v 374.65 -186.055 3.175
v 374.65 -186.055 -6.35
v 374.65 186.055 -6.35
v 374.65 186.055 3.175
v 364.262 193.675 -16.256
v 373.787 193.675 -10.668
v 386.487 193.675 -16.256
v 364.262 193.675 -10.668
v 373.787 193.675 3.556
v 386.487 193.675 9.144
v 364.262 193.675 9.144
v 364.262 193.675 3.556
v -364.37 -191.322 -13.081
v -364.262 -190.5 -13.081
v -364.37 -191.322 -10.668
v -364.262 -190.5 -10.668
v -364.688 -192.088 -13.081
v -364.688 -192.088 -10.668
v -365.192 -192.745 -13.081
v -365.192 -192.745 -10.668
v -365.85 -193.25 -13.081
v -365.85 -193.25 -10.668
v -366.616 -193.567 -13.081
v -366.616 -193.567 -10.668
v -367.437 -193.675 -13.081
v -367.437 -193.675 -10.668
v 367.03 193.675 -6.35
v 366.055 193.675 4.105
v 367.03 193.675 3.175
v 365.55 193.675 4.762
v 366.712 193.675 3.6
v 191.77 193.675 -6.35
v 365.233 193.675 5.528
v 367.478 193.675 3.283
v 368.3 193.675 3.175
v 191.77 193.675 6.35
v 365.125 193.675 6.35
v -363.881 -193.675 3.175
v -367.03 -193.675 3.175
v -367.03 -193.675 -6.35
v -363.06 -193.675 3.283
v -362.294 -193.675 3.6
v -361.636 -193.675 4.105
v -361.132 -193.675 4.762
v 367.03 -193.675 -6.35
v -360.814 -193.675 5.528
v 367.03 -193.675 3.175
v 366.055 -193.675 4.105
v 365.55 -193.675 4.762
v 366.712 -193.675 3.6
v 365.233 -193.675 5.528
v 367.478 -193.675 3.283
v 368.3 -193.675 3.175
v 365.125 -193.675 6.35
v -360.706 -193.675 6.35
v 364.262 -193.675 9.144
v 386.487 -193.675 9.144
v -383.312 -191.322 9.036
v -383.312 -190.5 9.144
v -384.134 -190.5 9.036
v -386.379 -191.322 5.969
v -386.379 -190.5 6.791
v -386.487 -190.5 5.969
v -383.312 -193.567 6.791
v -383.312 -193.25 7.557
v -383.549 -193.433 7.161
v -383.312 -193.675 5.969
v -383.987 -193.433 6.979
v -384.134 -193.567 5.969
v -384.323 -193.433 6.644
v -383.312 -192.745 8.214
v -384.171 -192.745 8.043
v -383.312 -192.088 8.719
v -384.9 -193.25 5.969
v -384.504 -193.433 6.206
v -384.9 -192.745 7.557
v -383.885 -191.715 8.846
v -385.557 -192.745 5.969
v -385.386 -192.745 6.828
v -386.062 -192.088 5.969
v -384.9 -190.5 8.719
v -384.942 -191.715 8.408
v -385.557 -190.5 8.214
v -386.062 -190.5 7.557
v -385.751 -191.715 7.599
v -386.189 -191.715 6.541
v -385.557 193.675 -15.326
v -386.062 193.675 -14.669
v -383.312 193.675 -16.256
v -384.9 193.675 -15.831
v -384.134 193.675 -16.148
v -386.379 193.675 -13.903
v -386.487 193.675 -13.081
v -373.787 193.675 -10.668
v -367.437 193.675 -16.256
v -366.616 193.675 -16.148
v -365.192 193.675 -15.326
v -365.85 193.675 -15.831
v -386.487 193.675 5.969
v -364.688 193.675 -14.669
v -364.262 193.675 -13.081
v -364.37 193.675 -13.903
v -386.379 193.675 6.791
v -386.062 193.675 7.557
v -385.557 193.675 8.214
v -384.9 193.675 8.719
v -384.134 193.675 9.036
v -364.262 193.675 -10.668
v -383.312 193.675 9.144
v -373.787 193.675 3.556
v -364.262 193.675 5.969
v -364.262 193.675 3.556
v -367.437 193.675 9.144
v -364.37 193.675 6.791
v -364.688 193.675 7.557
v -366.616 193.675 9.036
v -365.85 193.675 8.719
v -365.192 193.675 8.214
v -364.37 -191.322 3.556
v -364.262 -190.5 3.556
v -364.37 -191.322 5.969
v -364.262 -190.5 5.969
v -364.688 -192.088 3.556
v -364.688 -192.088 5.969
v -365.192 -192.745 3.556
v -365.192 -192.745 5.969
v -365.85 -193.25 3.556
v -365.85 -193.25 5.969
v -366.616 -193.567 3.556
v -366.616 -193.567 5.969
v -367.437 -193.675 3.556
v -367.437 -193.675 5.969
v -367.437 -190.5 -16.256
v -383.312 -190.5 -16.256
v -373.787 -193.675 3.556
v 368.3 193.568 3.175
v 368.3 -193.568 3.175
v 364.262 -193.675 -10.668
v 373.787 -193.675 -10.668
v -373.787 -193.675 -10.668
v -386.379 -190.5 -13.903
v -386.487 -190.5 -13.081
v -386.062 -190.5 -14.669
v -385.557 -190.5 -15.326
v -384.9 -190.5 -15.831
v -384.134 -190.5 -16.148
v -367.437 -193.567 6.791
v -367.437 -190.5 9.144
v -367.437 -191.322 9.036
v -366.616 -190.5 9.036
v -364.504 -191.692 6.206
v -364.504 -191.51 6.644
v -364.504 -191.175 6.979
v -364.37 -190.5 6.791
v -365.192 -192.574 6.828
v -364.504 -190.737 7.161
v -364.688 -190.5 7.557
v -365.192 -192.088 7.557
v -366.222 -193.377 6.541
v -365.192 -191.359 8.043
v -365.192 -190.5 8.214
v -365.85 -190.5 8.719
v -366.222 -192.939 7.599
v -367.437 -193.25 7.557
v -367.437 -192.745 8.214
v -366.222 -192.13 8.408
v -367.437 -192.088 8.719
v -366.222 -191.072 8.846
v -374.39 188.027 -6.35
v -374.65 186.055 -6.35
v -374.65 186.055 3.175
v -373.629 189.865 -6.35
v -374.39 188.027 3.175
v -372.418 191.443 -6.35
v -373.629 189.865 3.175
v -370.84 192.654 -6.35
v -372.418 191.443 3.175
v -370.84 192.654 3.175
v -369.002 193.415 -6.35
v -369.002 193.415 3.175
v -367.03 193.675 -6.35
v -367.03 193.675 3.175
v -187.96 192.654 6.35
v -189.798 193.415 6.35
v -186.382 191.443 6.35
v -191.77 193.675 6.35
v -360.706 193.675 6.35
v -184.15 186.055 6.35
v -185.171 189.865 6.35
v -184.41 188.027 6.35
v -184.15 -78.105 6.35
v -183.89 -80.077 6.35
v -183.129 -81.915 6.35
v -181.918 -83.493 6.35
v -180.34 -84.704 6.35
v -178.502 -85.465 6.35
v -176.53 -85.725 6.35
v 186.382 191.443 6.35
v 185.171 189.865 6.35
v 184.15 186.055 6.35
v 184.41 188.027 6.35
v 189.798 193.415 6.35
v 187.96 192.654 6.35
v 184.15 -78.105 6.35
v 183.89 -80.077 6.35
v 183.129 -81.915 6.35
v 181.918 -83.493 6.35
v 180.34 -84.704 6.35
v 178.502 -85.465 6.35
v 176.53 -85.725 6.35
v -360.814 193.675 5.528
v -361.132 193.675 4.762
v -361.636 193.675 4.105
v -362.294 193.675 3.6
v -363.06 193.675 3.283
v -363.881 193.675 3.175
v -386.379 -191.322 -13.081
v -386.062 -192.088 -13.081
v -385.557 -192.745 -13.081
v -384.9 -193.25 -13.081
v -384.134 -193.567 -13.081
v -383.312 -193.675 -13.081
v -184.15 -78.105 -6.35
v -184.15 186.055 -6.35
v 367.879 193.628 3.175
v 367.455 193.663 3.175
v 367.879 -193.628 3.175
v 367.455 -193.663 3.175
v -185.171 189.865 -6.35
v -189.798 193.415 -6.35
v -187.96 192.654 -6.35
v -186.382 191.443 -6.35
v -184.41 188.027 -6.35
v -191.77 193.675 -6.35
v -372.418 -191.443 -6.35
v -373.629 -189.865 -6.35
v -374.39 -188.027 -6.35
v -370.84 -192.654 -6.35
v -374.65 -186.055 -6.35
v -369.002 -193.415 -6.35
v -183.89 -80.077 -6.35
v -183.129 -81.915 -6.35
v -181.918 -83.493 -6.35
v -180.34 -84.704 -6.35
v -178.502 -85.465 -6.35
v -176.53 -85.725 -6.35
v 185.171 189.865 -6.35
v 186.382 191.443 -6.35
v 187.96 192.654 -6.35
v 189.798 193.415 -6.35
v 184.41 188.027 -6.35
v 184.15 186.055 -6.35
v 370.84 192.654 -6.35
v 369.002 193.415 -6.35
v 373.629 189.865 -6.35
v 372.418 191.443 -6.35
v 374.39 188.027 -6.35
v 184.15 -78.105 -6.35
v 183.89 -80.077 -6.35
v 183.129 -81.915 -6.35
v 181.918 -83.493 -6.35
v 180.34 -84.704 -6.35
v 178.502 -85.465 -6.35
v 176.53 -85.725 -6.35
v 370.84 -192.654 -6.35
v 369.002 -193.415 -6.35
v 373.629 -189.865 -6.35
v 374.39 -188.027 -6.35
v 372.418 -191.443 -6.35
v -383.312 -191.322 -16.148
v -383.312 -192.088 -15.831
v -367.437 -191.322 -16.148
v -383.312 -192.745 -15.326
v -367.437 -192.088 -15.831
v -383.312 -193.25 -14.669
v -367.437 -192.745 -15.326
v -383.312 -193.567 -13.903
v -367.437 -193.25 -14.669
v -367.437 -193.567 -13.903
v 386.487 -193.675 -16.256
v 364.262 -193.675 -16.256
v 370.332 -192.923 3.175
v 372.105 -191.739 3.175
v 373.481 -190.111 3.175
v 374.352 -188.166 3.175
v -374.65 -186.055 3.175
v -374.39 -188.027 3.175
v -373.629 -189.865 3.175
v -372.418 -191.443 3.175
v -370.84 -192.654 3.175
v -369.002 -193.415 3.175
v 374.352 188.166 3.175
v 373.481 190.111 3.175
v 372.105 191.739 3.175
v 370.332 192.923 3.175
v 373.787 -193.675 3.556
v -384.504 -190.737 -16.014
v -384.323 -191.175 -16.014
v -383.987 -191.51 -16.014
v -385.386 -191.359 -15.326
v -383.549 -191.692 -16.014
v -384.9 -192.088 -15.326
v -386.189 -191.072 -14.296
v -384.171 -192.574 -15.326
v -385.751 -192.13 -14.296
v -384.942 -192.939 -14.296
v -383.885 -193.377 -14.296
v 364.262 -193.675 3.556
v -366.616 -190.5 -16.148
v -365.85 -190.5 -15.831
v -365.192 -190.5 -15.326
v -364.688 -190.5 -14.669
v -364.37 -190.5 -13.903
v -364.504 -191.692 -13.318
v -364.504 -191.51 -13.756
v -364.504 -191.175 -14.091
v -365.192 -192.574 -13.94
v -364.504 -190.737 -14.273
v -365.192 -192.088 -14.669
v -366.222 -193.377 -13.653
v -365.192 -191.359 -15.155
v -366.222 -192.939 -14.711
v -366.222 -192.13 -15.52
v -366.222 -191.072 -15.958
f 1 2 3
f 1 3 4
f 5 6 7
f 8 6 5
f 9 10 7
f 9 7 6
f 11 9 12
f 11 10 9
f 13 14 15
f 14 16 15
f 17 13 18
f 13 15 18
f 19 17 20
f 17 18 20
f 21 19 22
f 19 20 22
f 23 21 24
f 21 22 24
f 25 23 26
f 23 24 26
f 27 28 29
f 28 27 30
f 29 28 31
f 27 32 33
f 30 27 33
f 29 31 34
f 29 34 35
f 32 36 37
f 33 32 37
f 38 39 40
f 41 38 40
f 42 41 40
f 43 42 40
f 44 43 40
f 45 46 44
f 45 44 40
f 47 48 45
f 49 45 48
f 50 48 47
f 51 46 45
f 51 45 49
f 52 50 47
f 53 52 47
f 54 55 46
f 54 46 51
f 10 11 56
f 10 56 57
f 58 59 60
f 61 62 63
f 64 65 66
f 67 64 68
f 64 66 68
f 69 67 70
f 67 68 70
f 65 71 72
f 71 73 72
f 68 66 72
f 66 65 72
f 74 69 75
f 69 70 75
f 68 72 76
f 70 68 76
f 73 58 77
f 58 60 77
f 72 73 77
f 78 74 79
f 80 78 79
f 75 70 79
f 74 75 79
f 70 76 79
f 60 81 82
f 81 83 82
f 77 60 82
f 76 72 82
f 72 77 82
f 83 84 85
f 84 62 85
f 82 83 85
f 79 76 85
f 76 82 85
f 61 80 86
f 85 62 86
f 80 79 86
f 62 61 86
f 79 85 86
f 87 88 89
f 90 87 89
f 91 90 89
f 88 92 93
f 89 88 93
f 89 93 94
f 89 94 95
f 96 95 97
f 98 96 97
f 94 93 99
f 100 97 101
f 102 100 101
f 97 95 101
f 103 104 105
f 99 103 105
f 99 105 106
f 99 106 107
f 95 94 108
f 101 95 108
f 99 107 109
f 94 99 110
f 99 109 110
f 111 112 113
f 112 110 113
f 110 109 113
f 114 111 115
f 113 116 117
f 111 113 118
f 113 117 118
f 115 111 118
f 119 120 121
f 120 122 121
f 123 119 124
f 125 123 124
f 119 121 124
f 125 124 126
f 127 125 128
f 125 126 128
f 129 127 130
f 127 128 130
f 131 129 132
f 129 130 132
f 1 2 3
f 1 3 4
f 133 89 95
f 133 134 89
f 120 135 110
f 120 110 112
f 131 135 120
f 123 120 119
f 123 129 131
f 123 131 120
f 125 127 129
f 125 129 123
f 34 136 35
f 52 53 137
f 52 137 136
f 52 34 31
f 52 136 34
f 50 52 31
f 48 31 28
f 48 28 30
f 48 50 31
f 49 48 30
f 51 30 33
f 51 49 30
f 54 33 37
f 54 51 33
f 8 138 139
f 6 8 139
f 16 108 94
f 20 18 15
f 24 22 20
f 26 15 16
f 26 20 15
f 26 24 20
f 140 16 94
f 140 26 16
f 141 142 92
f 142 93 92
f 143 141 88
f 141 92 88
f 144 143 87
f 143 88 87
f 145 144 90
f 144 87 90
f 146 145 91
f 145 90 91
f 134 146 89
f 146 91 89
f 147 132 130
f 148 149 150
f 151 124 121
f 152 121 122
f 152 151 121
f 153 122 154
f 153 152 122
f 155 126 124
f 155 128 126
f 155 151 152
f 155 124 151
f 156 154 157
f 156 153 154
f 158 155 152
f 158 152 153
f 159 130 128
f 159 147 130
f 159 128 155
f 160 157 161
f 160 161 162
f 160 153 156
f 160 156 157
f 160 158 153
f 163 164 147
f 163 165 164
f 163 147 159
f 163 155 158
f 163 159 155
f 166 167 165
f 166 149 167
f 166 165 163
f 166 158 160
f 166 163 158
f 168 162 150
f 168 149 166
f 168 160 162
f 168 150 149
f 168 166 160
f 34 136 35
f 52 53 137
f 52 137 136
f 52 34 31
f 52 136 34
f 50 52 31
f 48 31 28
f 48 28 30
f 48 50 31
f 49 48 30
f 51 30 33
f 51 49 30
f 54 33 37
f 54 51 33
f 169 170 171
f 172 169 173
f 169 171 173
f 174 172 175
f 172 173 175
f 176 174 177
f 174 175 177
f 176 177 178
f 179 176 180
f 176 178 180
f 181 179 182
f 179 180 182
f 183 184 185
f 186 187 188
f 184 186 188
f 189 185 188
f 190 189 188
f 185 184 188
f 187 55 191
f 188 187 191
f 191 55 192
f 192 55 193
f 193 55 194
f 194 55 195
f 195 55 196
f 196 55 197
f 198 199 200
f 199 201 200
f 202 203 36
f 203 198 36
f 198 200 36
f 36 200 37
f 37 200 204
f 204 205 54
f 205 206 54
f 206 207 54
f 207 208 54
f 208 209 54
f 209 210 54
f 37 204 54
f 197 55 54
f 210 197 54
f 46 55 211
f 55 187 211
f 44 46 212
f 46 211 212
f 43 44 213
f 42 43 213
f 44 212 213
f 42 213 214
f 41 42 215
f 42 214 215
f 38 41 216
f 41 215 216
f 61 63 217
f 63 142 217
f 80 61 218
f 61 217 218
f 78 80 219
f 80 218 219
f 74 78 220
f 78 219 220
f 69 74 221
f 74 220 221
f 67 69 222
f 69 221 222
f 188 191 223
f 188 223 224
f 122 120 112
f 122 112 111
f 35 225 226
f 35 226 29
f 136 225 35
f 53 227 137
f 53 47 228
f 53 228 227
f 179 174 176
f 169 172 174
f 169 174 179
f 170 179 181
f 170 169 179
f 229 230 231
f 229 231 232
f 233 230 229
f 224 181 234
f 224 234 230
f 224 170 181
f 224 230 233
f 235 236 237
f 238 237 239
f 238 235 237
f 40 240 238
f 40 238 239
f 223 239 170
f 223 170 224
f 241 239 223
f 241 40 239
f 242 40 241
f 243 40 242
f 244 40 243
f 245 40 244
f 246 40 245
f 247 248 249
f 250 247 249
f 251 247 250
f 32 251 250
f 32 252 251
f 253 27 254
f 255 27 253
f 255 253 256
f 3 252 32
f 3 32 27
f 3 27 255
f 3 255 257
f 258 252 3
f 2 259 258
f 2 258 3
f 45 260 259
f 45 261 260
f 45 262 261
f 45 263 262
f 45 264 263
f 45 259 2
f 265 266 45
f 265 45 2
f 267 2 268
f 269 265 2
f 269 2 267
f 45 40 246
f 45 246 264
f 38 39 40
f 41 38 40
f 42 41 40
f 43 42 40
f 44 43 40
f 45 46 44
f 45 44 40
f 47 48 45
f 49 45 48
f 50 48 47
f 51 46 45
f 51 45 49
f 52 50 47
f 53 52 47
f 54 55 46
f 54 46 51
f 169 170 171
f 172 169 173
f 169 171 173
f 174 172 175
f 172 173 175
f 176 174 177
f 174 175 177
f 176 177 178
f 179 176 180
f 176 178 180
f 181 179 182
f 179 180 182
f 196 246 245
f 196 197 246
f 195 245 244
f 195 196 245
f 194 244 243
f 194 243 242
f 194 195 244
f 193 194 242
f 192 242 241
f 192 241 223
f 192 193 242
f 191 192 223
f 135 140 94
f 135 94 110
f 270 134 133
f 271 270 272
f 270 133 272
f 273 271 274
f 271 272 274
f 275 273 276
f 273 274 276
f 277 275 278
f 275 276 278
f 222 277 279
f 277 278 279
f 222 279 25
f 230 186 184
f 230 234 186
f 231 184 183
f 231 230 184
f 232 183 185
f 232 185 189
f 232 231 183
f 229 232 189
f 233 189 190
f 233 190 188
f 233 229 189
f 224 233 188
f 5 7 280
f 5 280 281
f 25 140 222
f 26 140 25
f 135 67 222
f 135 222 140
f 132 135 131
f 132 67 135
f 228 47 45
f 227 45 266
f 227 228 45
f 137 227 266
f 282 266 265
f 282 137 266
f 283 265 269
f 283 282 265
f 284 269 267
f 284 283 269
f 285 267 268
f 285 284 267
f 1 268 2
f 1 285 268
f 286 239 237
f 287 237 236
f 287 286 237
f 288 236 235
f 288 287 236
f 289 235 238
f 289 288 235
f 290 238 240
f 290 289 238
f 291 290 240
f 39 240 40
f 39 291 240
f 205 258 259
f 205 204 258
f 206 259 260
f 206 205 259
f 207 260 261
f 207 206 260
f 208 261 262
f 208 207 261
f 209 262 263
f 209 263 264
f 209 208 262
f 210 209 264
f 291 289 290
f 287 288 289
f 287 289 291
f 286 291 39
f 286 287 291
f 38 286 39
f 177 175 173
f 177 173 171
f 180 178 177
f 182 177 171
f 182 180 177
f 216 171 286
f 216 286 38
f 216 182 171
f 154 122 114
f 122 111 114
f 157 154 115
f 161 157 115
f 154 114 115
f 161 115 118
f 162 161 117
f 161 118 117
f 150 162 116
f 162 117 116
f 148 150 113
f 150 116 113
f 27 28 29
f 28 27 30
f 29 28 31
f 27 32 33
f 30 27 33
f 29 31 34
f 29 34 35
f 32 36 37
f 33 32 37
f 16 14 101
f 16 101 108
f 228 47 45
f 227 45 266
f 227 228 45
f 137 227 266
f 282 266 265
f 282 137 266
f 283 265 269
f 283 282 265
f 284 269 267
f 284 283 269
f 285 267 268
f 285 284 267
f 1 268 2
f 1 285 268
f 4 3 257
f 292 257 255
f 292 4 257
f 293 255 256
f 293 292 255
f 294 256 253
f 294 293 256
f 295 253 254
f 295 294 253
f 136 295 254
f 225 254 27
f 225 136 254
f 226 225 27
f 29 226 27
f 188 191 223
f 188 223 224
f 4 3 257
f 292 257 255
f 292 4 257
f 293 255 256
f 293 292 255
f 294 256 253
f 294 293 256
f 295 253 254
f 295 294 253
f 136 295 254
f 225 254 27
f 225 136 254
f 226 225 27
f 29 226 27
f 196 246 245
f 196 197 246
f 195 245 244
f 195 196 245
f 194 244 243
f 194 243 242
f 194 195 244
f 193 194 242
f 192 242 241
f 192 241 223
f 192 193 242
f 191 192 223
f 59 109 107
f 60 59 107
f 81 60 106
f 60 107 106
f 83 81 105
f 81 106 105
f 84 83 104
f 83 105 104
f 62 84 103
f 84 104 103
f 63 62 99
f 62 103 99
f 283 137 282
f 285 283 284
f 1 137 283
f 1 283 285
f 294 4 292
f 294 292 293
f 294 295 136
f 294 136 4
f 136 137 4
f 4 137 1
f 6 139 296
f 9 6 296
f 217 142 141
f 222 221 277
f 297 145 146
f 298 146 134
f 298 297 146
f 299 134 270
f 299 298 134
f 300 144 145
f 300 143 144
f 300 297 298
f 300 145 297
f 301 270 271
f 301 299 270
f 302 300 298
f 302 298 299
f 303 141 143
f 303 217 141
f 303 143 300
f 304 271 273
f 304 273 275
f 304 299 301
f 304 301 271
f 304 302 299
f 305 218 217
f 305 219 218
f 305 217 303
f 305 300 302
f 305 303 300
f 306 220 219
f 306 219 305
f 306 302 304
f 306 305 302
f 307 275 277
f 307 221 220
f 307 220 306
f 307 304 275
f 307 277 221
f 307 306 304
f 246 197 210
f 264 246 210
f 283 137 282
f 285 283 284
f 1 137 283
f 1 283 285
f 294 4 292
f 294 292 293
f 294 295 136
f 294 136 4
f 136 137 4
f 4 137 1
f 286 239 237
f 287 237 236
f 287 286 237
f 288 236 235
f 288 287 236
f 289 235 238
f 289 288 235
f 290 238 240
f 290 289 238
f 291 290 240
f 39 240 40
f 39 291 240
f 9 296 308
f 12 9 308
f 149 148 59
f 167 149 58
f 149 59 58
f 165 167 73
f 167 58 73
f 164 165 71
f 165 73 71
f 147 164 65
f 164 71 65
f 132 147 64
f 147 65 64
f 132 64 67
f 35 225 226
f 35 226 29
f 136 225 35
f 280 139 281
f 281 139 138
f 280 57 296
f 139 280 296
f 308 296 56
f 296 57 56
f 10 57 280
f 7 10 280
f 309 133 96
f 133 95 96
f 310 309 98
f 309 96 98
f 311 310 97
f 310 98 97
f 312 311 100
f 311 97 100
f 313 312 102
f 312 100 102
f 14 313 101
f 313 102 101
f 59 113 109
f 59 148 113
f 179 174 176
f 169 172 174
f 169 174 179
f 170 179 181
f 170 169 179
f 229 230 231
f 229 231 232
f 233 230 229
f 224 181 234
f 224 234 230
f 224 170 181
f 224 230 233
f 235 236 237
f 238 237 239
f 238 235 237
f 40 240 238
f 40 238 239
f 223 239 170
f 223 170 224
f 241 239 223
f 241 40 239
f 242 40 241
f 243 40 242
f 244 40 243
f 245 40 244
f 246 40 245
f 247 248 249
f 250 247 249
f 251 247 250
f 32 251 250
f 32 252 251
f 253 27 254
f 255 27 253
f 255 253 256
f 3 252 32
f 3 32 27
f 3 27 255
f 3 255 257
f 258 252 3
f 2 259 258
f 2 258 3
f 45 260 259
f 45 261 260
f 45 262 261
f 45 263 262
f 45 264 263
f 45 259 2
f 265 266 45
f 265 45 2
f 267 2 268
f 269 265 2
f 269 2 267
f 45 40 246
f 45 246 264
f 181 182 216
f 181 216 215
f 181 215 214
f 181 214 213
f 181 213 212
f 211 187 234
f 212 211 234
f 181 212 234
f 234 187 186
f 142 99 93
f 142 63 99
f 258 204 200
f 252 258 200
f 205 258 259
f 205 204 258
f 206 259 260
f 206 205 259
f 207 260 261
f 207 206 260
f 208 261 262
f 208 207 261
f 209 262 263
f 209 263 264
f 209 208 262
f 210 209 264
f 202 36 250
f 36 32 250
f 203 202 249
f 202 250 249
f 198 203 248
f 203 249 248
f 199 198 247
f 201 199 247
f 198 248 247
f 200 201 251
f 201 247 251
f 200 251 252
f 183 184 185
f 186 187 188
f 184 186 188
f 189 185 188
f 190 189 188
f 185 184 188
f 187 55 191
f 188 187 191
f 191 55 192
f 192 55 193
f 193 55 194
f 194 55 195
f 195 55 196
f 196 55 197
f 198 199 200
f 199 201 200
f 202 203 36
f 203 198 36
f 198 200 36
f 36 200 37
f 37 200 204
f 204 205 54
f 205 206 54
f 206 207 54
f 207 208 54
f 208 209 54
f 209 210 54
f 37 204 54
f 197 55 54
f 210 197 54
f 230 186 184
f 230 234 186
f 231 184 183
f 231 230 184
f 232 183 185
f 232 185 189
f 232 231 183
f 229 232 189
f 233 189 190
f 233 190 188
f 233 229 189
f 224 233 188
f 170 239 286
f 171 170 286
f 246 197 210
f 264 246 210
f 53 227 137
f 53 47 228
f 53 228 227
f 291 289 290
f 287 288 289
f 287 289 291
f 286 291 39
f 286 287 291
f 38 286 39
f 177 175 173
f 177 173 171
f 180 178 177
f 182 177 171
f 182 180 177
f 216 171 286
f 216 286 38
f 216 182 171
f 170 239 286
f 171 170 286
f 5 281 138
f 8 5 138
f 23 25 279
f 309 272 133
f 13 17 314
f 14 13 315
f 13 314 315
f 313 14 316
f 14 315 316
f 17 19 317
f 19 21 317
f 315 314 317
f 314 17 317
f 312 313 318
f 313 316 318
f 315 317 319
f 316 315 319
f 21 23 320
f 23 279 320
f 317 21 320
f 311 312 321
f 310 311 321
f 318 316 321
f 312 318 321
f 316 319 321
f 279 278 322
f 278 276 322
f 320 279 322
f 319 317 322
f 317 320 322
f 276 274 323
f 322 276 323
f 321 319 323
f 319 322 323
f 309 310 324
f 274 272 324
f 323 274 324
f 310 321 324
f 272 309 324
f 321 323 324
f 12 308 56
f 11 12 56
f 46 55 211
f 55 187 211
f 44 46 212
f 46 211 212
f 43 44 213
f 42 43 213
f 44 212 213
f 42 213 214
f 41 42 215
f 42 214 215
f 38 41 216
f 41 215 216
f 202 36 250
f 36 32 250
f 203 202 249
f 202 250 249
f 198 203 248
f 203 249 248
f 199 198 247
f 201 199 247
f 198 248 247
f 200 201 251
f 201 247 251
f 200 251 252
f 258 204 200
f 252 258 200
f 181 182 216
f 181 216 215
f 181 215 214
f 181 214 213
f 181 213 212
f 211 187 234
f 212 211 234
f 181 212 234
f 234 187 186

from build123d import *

# Parameters (mm, degrees)
F0_W      = 749.3
F0_H      = 12.7
F1_DEPTH  = 193.675
F2_W      = 368.3
F2_H      = 279.4
F3_DEPTH  = 12.7
F4_R      = 7.62
F6_DEPTH  = 3.175
F9_W      = 9.525
F9_H      = 387.35
F10_DEPTH = 3.175
F12_DEPTH = 387.35
F14_DEPTH = 387.35
F16_R     = 3.17499
F16_2_R   = 3.17499
F16_3_R   = 3.17499


# Not quite as in the source:
# - a fillet or chamfer is up to 0.001 mm smaller than in the source, because OpenCascade refuses the exact size
# - a feature of the source that left no trace in its solid (it failed there, or was rolled back) is left out
# - a pattern or mirror of a feature is missing from the dataset's text; its kind, count and spacing are read off the source's solid


with BuildPart() as f1:
    # F0 (on Front) → F1 (new body, symmetric)
    with BuildSketch(Plane.XZ):
        Rectangle(F0_W, F0_H)
    extrude(amount=F1_DEPTH, both=True)

    # F2 (on face) → F3 (cut, symmetric)
    with BuildSketch(Plane.XY.offset(6.35)):
        with Locations((0, 53.975)):
            Rectangle(F2_W, F2_H)
    extrude(amount=F3_DEPTH, both=True, mode=Mode.SUBTRACT)

    # F4
    f4_edges = [f1.edges().sort_by_distance(p)[0] for p in [
        (-184.15, 193.675, 0),
        (-374.65, 193.675, 0),
        (-184.15, -85.725, 0),
        (184.15, -85.725, 0),
        (184.15, 193.675, 0),
        (374.65, 193.675, 0),
        (374.65, -193.675, 0),
        (-374.65, -193.675, 0),
    ]]
    fillet(f4_edges, radius=F4_R)

    # F5 (on face) → F6 (cut)
    with BuildSketch(Plane.XY.offset(6.35)):
        with BuildLine():
            Line((-360.706291008, -193.675), (-360.706291008, 193.675))
            Line((-360.706291008, 193.675), (-368.3, 193.675))
            ThreePointArc((-368.3, 193.675), (-372.7901280605, 191.8151280605), (-374.65, 187.325))
            Line((-374.65, 187.325), (-374.65, -193.675))
            Line((-374.65, -193.675), (-360.706291008, -193.675))
        make_face()
    extrude(amount=-F6_DEPTH, mode=Mode.SUBTRACT)

    # F9 (on face) → F10 (cut)
    with BuildSketch(Plane.XY.offset(6.35)):
        with Locations((369.8875, 0)):
            Rectangle(F9_W, F9_H)
    extrude(amount=-F10_DEPTH, mode=Mode.SUBTRACT)

    # F11 (on face) → F12 (join)
    with BuildSketch(Plane.XZ.offset(193.675)):
        with BuildLine():
            ThreePointArc((368.3, 3.175), (366.0549359697, 4.1049359697), (365.125, 6.35))
            Line((365.125, 6.35), (365.125, 3.175))
            Line((365.125, 3.175), (368.3, 3.175))
        make_face()
    extrude(amount=-F12_DEPTH)


with BuildPart() as f14:
    # F13 (on face) → F14 (new body)
    with BuildSketch(Plane.XZ.offset(193.675)):
        Polygon((-364.262291008, 3.556), (-364.262291008, 9.144), (-386.487291008, 9.144), (-386.487291008, -16.256), (-364.262291008, -16.256), (-364.262291008, -10.668), (-373.787291008, -10.668), (-373.787291008, 3.556), align=None)
    extrude(amount=-F14_DEPTH)


with BuildPart() as f14_copies_1:
    # F14_copies: instance of F14
    add(f14.part.mirror(Plane(origin=(0, 0, 0), x_dir=(0, 0, 1), z_dir=(1, 0, 0))))


with BuildPart() as f15_1:
    # F15: copy of F1
    add(f1.part)

    # F16#3 (radius 3.175 in the source; OpenCascade refuses exactly that, so slightly less here)
    f16_3_edges = [f15_1.edges().sort_by_distance(p)[0] for p in [
        (-360.706291, 0, 3.175),
    ]]
    fillet(f16_3_edges, radius=F16_3_R)


with BuildPart() as f14_1:
    add(f14.part)

    # F16 (radius 3.175 in the source; OpenCascade refuses exactly that, so slightly less here)
    f16_edges = [f14_1.edges().sort_by_distance(p)[0] for p in [
        (-386.487291, 0, 9.144),
        (-375.374791, -193.675, 9.144),
        (-386.487291, -193.675, -3.556),
        (-386.487291, 0, -16.256),
        (-375.374791, -193.675, -16.256),
        (-364.262291, -193.675, -13.462),
        (-364.262291, -193.675, 6.35),
        (-364.262291, 0, 9.144),
        (-364.262291, 0, -16.256),
    ]]
    fillet(f16_edges, radius=F16_R)


with BuildPart() as f1_1:
    add(f1.part)

    # F16#2 (radius 3.175 in the source; OpenCascade refuses exactly that, so slightly less here)
    f16_2_edges = [f1_1.edges().sort_by_distance(p)[0] for p in [
        (-360.706291, 0, 3.175),
    ]]
    fillet(f16_2_edges, radius=F16_2_R)


solid = Compound([f14_copies_1.part, f15_1.part, f14_1.part, f1_1.part])
